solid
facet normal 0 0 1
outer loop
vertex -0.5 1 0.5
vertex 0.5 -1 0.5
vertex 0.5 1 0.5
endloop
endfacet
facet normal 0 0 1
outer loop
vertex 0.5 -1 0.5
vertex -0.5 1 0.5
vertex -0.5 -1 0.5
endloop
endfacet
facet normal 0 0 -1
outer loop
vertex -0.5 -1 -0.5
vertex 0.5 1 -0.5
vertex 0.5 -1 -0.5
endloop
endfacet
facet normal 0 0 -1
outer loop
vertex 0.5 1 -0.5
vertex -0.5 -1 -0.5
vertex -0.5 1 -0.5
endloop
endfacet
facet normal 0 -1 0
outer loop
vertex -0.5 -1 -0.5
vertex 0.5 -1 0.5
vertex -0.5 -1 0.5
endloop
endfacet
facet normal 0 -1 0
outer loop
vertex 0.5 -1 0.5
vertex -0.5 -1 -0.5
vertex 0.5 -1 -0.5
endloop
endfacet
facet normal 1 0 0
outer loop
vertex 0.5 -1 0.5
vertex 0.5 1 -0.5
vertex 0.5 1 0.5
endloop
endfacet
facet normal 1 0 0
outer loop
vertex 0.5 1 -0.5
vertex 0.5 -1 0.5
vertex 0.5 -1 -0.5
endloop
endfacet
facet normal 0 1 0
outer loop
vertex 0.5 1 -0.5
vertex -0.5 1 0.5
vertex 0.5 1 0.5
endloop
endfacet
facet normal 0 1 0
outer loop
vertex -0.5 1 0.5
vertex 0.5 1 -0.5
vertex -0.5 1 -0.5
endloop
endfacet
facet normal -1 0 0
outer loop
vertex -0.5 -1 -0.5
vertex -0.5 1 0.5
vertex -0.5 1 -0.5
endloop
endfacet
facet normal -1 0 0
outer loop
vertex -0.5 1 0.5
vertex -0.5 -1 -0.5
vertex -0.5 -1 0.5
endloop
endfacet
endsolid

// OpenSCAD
module mycube2(a,b) {
    cube(size=[a, b, 1], center=true);
}

module mycube(a,b,c) {
    mycube2(a,b);
}

mycube(1,2,3);
